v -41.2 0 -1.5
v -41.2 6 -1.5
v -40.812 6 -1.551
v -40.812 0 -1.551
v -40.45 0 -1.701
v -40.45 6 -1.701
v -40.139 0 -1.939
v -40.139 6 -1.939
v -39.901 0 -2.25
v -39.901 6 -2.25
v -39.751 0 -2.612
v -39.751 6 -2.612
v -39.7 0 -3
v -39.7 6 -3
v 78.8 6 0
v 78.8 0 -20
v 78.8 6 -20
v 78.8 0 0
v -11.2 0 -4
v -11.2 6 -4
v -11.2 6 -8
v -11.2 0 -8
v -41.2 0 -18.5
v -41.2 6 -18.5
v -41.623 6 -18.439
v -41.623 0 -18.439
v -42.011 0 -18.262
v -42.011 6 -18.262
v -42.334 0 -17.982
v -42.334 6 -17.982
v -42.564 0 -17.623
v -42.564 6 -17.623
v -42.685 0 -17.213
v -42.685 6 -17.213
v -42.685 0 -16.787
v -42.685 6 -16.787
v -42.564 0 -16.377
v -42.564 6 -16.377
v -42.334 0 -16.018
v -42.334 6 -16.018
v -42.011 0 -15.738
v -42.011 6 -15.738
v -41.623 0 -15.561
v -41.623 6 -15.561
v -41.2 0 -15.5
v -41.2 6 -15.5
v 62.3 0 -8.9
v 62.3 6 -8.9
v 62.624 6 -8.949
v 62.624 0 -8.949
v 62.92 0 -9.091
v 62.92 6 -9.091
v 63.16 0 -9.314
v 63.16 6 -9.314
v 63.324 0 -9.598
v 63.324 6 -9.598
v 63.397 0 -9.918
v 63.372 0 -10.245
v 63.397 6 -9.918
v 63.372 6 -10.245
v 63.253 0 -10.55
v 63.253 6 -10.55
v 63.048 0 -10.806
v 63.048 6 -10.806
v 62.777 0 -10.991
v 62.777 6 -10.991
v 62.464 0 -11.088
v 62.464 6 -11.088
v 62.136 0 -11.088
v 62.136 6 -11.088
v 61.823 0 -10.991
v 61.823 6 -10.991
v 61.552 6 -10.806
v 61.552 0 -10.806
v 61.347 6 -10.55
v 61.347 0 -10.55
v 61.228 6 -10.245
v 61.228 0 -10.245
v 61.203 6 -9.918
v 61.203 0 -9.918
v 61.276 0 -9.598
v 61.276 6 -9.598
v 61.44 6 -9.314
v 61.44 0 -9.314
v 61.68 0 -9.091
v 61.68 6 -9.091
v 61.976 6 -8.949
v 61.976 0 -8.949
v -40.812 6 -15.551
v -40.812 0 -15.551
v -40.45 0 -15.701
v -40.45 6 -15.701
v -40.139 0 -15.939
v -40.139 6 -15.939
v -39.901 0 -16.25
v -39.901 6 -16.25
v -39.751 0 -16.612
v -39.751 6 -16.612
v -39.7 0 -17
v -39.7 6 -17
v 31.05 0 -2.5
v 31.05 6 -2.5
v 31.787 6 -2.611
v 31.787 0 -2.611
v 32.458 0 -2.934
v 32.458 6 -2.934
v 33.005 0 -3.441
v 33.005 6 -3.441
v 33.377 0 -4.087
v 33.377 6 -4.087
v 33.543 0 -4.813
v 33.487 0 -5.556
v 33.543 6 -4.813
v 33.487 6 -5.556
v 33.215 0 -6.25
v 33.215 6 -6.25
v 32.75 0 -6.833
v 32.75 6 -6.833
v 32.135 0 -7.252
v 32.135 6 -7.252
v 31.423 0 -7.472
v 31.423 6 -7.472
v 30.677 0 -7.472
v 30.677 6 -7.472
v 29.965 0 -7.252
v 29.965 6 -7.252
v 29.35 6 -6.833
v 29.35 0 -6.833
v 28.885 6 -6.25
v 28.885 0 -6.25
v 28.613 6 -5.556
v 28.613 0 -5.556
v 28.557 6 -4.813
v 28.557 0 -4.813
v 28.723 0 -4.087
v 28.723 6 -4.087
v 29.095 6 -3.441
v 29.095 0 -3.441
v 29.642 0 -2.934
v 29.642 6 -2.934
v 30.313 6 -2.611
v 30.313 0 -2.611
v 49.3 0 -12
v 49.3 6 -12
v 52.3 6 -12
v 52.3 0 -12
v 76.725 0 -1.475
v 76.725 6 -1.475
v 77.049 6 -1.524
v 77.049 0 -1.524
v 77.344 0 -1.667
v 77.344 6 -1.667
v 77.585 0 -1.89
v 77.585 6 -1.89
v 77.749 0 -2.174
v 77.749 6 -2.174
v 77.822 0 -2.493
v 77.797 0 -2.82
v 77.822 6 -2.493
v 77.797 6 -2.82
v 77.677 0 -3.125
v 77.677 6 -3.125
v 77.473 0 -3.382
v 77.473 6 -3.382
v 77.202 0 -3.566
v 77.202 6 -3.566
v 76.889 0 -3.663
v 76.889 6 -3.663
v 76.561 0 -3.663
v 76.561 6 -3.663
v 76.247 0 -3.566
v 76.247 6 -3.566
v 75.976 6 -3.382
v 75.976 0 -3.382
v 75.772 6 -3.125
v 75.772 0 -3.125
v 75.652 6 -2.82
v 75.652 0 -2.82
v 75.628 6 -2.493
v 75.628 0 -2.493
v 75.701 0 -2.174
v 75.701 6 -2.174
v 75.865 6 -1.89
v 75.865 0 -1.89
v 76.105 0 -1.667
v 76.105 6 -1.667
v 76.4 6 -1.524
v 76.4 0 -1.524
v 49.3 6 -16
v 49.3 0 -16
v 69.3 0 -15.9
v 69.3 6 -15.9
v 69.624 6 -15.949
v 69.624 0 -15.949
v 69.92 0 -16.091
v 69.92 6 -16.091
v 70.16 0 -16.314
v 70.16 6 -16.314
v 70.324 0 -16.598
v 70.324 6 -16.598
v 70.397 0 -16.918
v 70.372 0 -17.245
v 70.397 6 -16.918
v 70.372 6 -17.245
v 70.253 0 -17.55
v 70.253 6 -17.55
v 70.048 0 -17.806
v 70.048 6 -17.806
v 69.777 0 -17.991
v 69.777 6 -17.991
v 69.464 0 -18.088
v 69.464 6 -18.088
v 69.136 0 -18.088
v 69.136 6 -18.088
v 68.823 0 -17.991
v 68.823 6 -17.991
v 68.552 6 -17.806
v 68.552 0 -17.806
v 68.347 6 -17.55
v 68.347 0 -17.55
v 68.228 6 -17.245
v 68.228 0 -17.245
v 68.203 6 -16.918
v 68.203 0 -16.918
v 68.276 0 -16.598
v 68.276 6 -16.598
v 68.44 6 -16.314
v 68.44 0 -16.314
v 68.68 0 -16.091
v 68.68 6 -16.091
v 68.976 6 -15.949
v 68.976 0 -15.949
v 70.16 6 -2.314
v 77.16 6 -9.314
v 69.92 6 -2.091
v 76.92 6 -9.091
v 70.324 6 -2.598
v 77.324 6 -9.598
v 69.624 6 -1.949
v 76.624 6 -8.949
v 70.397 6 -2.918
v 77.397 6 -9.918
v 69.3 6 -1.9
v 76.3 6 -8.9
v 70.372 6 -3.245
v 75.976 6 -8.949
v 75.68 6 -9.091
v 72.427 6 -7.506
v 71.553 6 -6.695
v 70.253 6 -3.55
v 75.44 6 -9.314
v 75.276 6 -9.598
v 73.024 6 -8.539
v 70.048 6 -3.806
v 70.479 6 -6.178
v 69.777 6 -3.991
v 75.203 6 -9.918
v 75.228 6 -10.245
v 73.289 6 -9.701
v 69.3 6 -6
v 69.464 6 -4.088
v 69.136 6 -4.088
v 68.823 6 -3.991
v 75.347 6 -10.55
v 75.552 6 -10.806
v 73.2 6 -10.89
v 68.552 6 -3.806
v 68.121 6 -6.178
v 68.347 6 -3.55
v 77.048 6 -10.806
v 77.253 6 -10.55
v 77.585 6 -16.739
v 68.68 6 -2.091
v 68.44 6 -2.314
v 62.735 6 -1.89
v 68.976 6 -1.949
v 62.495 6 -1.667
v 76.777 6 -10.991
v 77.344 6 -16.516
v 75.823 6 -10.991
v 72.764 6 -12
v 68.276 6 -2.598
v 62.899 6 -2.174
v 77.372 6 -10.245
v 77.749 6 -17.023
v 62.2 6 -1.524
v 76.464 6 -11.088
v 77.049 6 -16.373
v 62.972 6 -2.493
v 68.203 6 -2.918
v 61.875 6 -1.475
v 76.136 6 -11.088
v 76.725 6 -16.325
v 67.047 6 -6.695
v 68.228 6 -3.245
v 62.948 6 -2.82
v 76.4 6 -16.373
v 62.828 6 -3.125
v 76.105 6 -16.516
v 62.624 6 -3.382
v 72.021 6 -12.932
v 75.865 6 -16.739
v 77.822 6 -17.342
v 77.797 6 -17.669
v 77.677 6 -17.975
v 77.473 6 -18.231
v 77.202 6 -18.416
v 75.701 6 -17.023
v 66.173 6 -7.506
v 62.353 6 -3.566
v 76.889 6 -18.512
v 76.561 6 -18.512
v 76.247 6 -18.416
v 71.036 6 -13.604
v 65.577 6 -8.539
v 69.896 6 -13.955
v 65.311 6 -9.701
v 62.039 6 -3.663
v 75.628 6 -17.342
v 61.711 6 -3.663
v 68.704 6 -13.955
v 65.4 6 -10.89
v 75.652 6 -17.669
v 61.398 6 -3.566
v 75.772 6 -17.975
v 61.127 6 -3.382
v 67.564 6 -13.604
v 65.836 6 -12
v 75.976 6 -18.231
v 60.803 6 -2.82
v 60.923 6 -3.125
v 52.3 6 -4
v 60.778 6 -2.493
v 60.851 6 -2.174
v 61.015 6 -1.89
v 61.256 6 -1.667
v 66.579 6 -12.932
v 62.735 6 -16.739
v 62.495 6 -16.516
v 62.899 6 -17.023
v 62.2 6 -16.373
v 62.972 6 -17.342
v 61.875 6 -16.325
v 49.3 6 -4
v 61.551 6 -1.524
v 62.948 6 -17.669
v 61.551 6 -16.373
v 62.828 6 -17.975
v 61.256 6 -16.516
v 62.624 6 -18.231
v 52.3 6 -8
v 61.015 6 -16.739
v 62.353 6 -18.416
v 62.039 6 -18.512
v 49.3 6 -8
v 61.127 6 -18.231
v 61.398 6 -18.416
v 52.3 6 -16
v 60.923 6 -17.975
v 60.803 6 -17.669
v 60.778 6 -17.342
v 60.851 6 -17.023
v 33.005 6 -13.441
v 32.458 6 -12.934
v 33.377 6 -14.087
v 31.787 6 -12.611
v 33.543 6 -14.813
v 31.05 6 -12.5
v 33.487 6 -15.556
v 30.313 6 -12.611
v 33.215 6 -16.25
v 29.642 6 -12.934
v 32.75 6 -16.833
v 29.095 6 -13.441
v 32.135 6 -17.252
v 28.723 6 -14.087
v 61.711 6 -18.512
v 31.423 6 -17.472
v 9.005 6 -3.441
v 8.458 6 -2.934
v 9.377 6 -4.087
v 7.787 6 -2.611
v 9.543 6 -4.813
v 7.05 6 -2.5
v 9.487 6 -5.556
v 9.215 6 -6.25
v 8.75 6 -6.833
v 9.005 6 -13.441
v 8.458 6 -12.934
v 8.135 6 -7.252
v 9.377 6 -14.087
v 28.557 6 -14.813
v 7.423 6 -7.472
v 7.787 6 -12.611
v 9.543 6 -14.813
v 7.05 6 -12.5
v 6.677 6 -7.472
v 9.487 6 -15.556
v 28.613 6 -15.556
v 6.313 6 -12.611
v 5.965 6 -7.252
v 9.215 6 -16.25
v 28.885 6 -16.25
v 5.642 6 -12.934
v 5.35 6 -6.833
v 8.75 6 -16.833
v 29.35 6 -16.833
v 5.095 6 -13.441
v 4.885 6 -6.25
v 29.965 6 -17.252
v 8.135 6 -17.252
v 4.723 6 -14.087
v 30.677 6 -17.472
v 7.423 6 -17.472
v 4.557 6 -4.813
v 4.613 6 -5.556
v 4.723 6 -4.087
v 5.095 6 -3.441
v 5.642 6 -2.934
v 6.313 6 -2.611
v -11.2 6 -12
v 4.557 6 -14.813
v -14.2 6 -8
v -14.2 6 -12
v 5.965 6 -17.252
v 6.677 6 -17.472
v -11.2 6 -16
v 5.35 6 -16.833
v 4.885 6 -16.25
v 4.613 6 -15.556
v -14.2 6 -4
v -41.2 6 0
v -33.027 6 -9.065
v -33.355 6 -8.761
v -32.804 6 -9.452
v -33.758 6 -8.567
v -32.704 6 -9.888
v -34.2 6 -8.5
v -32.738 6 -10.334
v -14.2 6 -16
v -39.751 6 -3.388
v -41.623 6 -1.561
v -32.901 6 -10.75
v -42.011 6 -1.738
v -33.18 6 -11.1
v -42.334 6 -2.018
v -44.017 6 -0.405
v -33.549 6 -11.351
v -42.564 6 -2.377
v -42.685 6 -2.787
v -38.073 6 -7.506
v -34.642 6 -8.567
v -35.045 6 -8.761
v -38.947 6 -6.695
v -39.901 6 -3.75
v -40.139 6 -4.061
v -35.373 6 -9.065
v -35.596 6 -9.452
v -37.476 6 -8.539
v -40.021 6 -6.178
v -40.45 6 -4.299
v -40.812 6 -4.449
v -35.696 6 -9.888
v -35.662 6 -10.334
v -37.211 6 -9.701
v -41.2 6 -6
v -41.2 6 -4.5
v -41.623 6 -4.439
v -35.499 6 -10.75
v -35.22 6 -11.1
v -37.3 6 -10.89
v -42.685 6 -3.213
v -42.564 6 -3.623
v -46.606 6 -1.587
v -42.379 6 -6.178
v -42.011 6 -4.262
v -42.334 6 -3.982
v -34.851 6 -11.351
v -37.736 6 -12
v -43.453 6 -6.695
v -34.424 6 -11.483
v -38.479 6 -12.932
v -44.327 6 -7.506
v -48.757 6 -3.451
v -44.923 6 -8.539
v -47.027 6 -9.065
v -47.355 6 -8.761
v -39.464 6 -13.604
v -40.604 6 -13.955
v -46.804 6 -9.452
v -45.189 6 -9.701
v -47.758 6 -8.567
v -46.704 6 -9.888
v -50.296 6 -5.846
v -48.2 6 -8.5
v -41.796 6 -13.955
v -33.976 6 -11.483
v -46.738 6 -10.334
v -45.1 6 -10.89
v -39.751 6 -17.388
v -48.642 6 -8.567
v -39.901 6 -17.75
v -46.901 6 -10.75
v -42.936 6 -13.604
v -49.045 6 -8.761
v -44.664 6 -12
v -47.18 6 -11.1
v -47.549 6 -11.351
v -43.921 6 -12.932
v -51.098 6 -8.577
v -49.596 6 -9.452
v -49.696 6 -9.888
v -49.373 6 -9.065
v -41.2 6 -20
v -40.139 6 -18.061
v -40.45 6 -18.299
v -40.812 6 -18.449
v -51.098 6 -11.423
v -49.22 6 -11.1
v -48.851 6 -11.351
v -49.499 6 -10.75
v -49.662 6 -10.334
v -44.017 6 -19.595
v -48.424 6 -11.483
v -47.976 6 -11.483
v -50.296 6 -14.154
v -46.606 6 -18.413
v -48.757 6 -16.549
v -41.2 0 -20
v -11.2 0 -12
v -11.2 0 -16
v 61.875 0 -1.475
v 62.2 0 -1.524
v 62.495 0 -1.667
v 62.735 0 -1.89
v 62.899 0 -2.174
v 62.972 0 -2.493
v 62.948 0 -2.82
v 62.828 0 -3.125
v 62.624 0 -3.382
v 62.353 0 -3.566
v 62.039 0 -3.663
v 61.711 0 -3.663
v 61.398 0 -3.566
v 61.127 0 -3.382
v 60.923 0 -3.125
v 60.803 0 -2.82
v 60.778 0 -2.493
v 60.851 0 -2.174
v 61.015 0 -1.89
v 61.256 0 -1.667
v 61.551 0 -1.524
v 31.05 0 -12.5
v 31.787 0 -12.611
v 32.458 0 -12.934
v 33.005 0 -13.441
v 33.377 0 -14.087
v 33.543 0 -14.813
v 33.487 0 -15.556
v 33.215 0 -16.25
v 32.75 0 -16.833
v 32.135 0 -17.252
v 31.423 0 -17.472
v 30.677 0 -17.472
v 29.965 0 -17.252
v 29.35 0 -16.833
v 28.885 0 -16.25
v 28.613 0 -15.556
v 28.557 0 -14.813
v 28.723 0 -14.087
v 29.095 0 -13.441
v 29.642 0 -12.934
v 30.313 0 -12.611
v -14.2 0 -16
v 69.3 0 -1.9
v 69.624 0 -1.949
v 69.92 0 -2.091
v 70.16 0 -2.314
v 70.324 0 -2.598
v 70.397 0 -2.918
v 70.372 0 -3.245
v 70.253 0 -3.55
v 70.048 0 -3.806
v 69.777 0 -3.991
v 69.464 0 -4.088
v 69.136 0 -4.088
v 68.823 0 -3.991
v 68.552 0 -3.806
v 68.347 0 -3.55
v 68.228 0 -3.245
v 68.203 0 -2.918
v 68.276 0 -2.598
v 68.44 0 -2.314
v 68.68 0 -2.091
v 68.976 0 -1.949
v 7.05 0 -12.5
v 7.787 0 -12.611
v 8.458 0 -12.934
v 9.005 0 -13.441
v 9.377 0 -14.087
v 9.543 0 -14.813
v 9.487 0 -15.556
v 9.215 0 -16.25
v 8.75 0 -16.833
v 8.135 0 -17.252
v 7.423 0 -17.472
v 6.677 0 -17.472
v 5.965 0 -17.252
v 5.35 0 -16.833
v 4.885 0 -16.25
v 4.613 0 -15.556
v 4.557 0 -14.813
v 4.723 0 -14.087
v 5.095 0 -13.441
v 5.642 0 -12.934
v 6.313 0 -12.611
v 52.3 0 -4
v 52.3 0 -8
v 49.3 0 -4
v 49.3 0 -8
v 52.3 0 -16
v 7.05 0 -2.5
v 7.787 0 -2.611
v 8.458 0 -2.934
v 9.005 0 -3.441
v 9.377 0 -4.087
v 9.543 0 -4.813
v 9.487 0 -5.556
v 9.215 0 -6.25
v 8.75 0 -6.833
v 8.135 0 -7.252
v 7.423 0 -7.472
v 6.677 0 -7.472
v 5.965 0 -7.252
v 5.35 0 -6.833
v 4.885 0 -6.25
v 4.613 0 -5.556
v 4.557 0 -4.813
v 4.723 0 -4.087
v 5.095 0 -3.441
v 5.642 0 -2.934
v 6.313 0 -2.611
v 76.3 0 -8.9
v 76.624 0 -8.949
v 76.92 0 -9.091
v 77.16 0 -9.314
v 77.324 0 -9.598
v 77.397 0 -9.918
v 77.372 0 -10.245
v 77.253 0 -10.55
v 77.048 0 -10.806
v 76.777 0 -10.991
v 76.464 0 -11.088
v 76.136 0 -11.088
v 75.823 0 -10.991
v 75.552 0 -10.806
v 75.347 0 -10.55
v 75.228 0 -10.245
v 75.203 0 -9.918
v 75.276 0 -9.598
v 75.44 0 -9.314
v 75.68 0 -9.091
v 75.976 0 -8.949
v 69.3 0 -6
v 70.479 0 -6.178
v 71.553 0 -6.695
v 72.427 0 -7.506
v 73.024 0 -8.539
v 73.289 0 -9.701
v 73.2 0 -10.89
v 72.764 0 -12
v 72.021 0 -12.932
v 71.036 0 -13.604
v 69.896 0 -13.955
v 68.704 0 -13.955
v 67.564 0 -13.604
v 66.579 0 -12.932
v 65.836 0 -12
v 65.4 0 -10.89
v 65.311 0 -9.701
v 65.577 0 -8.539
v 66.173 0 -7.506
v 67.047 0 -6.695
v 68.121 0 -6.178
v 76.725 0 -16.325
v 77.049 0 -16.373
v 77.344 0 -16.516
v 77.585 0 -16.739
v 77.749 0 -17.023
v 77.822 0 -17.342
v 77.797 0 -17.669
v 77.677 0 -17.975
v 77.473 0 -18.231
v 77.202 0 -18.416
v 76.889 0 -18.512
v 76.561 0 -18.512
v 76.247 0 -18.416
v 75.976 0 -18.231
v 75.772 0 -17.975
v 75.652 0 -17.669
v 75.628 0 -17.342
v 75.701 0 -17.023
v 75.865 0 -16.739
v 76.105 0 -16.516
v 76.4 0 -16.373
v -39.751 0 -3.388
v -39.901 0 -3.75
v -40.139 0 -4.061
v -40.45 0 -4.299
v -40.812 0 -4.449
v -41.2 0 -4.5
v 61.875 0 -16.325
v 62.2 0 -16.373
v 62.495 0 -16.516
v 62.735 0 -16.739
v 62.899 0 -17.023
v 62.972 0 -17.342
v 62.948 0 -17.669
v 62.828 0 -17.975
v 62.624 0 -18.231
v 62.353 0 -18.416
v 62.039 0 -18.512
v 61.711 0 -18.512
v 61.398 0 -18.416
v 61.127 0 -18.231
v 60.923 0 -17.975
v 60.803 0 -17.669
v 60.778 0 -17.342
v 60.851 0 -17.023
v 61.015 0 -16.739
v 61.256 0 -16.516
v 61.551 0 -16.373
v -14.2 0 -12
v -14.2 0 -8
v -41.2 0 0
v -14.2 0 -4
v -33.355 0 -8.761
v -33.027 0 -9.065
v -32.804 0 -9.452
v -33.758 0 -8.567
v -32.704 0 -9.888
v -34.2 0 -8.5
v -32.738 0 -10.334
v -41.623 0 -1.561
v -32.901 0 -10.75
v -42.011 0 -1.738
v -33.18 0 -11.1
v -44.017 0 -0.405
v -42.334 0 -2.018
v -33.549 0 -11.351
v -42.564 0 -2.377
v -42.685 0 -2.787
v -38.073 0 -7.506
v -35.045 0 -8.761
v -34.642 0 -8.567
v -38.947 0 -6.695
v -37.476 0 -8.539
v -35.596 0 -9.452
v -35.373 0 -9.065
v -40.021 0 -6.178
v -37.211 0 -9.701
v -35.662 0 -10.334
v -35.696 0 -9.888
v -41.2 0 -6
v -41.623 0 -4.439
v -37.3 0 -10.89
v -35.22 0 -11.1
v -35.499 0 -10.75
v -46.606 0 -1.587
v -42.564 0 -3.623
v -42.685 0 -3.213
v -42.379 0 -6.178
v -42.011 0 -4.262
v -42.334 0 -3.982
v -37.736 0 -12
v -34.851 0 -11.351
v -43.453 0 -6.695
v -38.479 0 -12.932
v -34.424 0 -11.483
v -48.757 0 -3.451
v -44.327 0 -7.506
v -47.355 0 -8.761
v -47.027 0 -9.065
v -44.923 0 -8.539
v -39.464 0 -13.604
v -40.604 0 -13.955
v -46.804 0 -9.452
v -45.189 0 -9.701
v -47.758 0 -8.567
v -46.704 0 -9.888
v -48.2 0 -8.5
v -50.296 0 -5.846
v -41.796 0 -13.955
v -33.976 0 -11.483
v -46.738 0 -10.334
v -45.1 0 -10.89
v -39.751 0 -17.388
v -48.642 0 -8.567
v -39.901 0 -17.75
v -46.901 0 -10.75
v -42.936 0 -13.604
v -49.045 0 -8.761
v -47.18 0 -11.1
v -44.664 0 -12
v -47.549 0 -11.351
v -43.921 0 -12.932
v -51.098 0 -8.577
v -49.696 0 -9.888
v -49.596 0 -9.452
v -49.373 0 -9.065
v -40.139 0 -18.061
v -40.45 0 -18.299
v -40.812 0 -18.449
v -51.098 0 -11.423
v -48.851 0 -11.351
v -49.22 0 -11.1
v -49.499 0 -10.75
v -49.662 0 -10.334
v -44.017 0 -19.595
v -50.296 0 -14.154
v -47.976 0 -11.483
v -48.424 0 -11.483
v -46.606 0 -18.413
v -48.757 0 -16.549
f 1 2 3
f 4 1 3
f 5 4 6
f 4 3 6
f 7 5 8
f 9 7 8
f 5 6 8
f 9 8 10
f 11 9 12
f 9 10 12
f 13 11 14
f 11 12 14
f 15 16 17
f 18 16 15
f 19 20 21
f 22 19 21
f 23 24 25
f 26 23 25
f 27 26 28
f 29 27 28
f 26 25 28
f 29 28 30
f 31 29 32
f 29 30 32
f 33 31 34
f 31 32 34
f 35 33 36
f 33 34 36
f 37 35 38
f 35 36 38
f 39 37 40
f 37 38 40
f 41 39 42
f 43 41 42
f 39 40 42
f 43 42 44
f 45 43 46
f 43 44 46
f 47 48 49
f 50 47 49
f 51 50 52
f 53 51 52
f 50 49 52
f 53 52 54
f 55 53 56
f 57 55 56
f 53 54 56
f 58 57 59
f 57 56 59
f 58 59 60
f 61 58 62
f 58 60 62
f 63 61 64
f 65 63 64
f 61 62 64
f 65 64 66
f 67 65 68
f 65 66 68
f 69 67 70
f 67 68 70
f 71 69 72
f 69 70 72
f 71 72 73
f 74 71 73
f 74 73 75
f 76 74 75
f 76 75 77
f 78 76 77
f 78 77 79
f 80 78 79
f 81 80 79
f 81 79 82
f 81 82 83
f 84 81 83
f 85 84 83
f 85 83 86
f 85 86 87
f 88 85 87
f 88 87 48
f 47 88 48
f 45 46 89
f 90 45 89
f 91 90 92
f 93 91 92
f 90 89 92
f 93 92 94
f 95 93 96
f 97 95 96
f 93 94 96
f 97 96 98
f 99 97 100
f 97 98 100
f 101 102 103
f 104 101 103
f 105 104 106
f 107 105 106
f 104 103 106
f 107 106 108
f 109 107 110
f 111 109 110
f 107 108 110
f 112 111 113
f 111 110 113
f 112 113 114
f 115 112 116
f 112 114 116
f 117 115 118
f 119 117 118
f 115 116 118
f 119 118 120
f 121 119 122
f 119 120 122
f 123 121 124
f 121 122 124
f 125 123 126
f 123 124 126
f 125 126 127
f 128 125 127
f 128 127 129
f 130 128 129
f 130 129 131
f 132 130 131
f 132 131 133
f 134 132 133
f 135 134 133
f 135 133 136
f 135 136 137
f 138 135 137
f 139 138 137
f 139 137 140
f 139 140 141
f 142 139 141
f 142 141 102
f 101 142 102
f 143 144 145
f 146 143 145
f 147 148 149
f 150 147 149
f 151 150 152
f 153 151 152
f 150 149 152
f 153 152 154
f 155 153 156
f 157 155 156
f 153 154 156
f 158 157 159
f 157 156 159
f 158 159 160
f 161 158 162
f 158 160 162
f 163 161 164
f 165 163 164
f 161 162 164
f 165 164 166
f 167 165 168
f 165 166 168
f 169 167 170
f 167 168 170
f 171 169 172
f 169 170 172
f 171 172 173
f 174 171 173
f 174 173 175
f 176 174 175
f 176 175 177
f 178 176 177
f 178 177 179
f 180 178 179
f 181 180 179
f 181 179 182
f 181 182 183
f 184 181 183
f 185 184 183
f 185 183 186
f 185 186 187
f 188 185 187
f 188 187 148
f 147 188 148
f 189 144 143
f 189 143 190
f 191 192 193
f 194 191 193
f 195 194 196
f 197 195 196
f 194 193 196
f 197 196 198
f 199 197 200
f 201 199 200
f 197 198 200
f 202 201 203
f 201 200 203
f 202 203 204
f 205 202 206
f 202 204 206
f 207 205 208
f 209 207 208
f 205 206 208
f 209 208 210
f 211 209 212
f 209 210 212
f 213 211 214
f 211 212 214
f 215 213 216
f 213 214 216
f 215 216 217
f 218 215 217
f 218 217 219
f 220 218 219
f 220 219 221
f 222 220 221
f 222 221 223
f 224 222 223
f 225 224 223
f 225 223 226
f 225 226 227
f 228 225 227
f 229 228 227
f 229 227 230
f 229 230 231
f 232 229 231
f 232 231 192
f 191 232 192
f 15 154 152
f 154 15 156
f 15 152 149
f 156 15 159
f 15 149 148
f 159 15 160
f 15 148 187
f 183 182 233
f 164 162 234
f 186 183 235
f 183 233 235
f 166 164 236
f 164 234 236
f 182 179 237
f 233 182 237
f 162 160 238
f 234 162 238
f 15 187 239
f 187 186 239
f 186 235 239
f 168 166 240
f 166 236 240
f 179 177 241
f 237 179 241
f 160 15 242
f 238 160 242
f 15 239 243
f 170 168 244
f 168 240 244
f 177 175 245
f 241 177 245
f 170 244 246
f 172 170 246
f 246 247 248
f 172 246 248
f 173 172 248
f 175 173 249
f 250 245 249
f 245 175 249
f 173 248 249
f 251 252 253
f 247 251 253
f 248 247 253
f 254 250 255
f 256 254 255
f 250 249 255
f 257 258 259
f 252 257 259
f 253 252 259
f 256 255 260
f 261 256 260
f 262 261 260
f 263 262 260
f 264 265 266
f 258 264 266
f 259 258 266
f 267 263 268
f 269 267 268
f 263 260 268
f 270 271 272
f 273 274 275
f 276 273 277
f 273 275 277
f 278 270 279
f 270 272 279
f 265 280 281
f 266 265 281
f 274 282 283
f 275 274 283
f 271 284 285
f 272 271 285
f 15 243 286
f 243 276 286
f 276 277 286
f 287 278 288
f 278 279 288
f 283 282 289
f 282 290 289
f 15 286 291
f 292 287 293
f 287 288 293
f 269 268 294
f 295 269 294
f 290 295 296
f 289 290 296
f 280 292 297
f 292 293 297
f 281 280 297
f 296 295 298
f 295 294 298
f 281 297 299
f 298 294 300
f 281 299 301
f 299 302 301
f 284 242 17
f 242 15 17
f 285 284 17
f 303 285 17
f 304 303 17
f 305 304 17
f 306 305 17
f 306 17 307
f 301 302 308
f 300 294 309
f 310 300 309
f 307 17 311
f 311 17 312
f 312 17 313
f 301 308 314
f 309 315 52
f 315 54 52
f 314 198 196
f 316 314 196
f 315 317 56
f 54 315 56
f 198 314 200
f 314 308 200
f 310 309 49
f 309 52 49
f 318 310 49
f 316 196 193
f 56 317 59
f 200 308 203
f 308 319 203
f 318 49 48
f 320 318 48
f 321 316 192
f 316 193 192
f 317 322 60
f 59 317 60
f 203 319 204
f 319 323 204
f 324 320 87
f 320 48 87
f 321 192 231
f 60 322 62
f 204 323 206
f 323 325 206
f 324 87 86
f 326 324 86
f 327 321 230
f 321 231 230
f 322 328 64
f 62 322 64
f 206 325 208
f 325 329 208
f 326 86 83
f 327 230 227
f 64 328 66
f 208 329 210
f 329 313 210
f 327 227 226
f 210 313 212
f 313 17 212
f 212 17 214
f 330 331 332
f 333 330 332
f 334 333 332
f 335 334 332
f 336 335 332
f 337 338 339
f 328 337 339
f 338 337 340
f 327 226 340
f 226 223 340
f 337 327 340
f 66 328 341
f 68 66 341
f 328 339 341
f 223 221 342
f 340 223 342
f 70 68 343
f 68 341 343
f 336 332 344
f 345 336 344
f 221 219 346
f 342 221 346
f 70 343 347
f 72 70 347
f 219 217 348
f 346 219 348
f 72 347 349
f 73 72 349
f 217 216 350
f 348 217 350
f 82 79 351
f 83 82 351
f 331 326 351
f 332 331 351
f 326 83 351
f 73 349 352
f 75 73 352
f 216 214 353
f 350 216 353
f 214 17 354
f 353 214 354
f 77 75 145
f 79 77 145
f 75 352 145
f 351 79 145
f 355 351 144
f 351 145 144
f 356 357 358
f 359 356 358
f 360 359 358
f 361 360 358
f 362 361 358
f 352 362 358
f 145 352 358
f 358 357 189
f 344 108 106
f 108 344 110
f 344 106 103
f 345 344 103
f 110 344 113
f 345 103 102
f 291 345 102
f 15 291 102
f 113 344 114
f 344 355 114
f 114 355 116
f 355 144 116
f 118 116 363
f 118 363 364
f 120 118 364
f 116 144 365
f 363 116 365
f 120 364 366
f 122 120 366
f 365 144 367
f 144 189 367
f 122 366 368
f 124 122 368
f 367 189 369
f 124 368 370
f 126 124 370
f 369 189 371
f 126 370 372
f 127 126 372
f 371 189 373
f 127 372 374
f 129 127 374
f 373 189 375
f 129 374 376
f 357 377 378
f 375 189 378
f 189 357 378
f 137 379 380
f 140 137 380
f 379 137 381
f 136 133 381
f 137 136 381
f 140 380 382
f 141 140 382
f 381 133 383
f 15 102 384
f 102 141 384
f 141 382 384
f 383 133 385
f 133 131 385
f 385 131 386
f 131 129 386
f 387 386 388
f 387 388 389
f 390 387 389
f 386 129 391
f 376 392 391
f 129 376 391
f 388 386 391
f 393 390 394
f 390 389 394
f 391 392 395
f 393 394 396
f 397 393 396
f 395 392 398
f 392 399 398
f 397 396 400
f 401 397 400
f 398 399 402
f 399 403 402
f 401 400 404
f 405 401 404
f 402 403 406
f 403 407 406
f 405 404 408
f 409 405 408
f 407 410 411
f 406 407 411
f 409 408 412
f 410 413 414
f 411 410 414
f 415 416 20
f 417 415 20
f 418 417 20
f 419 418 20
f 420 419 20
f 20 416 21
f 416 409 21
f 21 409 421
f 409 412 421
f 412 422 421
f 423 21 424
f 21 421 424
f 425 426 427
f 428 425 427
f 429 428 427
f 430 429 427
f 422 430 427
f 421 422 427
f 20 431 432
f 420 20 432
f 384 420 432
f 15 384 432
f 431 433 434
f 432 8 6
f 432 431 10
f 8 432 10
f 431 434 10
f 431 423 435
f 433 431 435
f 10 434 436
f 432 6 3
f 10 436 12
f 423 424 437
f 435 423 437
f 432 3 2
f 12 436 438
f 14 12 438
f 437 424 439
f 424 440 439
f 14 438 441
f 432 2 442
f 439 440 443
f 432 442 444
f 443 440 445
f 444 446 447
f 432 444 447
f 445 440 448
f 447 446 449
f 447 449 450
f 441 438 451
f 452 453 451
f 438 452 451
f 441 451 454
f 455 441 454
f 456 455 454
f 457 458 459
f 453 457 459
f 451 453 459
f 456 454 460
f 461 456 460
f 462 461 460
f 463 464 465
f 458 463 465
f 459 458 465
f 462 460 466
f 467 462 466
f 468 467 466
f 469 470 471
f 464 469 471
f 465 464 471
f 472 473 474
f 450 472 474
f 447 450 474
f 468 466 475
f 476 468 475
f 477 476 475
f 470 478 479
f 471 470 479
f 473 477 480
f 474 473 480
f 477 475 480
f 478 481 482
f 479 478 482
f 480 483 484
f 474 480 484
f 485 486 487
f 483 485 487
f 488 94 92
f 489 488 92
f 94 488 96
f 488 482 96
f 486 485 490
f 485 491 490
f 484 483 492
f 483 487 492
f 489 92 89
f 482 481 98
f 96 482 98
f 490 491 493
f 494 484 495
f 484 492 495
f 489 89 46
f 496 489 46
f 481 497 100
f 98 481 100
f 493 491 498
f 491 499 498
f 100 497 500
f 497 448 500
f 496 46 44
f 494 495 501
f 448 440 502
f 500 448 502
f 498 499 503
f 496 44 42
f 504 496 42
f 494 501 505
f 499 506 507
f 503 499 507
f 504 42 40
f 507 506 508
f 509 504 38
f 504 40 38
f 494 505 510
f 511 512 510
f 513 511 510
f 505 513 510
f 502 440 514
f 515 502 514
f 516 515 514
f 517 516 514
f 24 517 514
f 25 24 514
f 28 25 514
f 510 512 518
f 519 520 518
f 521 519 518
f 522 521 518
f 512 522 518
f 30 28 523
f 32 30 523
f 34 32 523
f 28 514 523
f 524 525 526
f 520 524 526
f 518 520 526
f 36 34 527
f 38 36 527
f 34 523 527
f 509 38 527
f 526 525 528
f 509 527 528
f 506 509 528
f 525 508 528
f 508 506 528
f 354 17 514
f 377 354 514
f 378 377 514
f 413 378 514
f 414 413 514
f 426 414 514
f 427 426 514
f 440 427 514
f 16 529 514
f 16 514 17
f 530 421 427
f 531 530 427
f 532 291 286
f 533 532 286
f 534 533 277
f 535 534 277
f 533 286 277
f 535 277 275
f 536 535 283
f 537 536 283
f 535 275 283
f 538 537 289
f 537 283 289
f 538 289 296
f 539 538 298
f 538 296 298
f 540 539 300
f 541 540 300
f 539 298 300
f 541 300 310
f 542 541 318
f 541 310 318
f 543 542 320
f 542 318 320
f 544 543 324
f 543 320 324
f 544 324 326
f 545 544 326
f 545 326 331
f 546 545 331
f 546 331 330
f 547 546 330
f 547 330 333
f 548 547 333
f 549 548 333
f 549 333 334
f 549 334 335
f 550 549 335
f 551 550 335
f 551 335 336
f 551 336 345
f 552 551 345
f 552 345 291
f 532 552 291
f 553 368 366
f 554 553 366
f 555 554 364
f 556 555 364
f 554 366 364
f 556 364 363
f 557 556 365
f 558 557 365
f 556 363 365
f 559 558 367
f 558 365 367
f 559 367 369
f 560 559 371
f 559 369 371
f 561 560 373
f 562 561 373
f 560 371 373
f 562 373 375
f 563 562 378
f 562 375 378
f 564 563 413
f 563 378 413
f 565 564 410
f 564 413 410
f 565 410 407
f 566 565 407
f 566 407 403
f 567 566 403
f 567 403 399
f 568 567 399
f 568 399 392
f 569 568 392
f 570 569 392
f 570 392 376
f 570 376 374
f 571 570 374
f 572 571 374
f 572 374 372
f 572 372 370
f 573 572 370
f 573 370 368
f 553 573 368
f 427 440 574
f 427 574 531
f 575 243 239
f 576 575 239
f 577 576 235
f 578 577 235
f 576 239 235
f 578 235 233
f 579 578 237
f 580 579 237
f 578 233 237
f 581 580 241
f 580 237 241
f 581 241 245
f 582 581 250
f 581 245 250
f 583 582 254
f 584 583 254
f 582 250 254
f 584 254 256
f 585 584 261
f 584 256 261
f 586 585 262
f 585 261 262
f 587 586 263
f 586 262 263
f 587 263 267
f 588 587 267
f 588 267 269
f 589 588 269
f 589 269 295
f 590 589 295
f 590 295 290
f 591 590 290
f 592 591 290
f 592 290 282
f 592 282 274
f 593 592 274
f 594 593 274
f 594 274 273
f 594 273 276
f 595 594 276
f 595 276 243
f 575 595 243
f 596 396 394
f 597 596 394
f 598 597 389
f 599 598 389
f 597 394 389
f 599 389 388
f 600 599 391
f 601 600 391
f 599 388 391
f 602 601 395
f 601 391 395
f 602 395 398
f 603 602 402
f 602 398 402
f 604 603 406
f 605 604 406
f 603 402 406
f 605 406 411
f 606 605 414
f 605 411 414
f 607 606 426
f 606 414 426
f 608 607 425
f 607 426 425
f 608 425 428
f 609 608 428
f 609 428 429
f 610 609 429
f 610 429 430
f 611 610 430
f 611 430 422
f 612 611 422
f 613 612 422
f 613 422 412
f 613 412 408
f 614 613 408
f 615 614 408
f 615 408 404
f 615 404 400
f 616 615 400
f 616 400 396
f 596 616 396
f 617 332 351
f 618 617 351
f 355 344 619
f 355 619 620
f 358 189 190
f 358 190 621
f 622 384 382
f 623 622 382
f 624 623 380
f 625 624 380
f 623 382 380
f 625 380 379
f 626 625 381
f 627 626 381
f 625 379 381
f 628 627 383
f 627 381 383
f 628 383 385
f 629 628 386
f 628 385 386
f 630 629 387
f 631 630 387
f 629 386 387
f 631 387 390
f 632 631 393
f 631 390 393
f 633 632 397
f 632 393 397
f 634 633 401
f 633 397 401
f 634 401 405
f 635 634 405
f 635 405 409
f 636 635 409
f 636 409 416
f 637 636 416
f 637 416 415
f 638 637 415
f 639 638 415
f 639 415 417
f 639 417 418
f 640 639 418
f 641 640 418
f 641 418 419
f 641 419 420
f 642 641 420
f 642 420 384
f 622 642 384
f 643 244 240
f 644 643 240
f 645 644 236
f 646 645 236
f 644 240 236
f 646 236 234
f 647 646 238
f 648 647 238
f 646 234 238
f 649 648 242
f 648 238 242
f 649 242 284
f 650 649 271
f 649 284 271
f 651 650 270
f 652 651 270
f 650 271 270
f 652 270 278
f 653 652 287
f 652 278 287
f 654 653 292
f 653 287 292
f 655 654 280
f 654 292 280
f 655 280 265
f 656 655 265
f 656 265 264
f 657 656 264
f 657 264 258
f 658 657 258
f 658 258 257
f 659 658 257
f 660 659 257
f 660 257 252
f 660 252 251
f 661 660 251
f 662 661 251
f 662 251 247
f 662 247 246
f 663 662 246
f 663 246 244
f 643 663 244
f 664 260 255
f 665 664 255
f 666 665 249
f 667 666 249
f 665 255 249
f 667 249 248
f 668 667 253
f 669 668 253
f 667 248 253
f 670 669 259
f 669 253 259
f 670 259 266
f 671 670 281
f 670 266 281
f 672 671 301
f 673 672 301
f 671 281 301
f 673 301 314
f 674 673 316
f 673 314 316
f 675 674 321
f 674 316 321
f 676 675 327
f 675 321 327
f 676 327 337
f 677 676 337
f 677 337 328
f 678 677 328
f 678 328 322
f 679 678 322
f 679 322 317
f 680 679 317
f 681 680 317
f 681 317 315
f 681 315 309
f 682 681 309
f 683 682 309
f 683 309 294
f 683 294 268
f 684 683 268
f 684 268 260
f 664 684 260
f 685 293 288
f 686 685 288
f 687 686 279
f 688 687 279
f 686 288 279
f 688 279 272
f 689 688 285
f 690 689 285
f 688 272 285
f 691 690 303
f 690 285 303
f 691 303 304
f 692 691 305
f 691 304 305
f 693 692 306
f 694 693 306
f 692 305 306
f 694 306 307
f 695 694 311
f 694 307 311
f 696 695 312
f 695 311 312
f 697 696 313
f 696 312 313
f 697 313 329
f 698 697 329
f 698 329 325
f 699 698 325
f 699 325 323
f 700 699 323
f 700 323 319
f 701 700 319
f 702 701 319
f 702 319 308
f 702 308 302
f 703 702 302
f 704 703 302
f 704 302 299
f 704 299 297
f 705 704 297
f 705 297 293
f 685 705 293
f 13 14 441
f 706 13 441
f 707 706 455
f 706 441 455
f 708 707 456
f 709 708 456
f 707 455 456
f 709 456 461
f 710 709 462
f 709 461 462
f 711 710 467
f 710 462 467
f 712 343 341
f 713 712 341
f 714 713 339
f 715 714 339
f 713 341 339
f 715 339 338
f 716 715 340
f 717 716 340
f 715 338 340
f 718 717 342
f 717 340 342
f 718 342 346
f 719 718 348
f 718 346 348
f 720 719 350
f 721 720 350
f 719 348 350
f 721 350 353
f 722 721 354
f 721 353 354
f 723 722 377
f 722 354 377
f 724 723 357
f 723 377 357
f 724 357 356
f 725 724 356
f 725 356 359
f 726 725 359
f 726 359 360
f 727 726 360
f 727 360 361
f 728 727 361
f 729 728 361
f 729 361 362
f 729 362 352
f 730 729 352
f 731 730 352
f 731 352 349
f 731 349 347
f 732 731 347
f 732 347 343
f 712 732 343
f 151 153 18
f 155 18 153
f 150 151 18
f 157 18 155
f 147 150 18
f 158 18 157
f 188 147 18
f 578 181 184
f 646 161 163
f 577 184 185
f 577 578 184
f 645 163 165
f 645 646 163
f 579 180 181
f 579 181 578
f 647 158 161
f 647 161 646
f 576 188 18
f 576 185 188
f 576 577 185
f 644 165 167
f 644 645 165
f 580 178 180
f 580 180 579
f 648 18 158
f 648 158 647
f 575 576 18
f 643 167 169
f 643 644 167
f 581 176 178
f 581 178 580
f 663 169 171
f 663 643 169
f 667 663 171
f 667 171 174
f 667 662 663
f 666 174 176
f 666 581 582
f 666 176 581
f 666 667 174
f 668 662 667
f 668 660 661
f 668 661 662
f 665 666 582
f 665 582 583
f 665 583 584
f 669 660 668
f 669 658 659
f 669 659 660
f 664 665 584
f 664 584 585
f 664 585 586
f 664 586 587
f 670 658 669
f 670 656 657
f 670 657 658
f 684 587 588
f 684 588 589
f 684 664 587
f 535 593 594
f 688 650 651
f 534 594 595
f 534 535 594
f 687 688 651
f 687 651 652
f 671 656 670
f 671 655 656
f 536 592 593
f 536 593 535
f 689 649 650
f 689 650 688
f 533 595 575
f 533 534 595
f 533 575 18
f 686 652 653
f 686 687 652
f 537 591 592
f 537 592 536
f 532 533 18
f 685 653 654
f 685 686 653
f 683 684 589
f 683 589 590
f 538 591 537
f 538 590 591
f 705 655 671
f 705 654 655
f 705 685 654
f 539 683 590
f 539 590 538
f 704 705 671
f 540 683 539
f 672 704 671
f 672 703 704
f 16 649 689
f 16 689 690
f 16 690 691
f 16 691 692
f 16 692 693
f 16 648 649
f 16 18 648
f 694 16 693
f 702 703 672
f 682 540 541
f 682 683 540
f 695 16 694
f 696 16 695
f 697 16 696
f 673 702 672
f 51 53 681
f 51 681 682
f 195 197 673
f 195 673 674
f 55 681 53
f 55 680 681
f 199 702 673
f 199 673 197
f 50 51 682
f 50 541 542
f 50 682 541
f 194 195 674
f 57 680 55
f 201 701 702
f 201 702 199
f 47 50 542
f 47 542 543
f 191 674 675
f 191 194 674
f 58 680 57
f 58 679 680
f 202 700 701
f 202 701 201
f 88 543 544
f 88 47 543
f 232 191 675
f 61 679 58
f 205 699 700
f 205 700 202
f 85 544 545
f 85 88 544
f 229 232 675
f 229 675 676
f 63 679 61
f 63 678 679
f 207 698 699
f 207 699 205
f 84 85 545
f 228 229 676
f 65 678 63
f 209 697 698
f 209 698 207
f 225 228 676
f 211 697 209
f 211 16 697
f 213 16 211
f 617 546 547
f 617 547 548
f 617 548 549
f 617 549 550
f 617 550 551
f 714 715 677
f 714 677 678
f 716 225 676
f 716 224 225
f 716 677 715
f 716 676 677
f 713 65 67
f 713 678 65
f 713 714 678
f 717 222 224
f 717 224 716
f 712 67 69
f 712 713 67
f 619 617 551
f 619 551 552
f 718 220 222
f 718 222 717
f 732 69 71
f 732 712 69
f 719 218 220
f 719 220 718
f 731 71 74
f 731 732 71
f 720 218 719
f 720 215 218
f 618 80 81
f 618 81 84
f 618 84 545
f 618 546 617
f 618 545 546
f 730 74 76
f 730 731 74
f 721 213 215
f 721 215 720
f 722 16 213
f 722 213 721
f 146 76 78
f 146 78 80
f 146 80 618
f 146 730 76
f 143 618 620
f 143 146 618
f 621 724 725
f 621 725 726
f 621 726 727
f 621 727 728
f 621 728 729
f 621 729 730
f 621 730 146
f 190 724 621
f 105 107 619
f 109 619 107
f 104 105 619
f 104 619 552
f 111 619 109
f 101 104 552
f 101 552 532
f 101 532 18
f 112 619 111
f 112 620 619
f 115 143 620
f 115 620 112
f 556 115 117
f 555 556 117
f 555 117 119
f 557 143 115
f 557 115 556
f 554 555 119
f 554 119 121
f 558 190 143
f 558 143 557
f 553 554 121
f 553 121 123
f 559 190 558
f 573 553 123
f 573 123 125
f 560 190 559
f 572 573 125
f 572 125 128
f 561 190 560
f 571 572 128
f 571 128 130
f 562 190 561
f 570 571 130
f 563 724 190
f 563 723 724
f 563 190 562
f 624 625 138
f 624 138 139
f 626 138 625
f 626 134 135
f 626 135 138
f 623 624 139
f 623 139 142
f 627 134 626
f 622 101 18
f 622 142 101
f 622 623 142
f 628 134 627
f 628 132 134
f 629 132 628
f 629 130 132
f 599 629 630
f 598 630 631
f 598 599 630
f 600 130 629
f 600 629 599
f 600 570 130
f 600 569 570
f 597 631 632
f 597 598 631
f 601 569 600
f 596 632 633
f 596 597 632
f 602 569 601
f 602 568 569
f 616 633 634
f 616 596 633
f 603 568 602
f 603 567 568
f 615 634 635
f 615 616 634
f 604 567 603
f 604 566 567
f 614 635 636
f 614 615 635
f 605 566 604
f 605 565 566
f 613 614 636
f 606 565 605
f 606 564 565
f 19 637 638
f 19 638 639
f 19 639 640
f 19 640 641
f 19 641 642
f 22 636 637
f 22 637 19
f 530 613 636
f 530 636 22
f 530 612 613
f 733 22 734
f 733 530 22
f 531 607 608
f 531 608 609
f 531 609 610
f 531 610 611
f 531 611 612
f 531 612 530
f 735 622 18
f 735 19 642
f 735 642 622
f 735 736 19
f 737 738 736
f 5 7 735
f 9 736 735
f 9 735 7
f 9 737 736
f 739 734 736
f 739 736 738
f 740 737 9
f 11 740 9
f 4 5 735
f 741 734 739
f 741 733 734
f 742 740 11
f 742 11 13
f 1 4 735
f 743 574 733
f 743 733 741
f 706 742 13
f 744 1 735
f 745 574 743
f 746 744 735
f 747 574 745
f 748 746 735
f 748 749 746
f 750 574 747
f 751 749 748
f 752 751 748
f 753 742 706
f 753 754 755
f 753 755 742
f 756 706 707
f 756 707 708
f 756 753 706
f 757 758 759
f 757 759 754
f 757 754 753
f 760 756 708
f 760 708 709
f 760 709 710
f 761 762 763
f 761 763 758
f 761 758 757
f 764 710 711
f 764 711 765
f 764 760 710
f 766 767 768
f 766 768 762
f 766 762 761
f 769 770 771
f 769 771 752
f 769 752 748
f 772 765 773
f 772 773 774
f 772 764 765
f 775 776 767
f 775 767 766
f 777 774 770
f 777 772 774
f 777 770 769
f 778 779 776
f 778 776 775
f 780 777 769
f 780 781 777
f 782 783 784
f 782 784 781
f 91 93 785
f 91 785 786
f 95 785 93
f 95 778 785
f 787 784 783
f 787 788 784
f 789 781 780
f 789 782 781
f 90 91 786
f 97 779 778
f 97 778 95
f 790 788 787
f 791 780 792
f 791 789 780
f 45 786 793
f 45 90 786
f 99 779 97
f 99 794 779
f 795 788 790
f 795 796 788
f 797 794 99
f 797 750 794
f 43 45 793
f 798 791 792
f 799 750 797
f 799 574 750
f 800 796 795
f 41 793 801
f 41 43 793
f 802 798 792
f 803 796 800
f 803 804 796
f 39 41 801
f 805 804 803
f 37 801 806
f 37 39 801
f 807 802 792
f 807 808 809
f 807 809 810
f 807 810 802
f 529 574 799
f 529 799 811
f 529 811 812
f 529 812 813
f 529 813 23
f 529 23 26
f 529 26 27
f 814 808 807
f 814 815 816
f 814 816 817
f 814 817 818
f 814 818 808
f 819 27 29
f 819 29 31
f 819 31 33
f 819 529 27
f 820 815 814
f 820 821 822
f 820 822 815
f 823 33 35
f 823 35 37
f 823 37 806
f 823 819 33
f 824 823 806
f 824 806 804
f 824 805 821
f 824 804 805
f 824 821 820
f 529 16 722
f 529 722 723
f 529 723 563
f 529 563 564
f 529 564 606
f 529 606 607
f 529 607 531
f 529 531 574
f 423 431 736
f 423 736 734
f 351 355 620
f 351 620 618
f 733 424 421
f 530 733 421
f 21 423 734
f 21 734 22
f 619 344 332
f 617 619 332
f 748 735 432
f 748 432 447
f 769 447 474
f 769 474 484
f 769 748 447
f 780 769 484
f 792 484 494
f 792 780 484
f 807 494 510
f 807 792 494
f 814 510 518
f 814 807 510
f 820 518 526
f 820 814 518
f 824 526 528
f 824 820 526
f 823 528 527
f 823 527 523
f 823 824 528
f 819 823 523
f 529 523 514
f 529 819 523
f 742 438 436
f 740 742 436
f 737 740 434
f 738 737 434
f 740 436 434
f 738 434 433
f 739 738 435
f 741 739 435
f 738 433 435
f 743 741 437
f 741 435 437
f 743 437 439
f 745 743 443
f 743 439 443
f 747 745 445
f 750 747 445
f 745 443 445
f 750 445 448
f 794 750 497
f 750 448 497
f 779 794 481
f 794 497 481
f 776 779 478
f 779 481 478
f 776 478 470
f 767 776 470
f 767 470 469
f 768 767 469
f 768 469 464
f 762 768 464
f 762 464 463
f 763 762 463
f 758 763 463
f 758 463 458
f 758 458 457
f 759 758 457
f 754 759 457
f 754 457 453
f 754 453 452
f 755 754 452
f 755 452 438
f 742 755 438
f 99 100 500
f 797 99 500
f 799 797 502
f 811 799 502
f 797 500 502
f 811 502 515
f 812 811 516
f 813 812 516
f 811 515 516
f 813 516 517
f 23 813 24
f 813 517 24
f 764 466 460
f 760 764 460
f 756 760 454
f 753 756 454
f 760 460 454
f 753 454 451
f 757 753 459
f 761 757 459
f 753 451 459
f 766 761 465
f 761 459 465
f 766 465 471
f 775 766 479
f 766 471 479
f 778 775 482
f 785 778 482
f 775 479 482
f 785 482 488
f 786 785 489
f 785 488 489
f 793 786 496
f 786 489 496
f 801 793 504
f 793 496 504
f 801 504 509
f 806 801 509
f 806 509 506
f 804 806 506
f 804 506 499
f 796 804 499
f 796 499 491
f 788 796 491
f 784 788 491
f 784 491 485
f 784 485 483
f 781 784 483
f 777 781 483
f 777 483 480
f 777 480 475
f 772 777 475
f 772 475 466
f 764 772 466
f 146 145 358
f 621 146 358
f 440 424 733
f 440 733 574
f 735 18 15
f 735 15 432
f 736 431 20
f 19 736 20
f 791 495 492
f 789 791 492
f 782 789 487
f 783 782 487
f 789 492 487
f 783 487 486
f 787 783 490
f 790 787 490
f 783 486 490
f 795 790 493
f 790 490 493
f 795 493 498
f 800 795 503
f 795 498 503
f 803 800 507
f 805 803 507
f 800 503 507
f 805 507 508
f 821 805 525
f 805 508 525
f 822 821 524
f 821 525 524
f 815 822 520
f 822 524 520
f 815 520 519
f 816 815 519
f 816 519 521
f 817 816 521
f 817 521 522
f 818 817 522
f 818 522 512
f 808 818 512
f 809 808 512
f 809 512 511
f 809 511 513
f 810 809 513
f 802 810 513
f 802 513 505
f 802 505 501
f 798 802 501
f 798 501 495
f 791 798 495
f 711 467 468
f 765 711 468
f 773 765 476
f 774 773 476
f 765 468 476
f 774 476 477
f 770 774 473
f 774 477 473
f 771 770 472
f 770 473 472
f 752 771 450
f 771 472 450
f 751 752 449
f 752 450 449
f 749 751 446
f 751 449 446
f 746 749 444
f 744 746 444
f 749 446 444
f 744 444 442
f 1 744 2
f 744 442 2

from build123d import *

# Parameters (mm, degrees)
EXTRUDE_1_DEPTH     = 6
SKETCH_2_R          = 1.5
SKETCH_2_R_2        = 4
CUT_EXTRUDE_1_DEPTH = 10
SKETCH_3_W          = 3
SKETCH_3_H          = 4
CUT_EXTRUDE_2_DEPTH = 10
SKETCH_4_R          = 4
SKETCH_4_R_2        = 1.1
SKETCH_4_W          = 3
SKETCH_4_H          = 4
CUT_EXTRUDE_4_DEPTH = 10
SKETCH_5_R          = 2.5
CUT_EXTRUDE_5_DEPTH = 10


with BuildPart() as part:
    # 草图1 → 凸台-拉伸1 (new body)
    with BuildSketch(Plane(origin=(0, 0, 0), x_dir=(1, 0, 0), z_dir=(0, 1, 0))):
        with BuildLine():
            Line((-41.199983302, 20), (78.800016698, 20))
            Line((78.800016698, 20), (78.800016698, 0))
            Line((78.800016698, 0), (-41.199983302, 0))
            ThreePointArc((-41.199983302, 0), (-51.199983302, 10), (-41.199983302, 20))
        make_face()
    extrude(amount=EXTRUDE_1_DEPTH)

    # 草图2 → 切除-拉伸1 (cut)
    with BuildSketch(Plane(origin=(0, 6, 0), x_dir=(1, 0, 0), z_dir=(0, 1, 0))):
        with Locations(Location((-48.199983302, 10, 0), (0, 0, 270))):
            Circle(SKETCH_2_R)
        with BuildLine():
            ThreePointArc((-39.699983302, 17), (-40.13932313, 18.060660172), (-41.199983302, 18.5))
            Line((-41.199983302, 18.5), (-41.199983302, 17))
            Line((-41.199983302, 17), (-41.199983302, 15.5))
            ThreePointArc((-41.199983302, 15.5), (-40.13932313, 15.939339828), (-39.699983302, 17))
        make_face()
        with BuildLine():
            Line((-41.199983302, 17), (-41.199983302, 18.5))
            ThreePointArc((-41.199983302, 18.5), (-42.699983302, 17), (-41.199983302, 15.5))
            Line((-41.199983302, 15.5), (-41.199983302, 17))
        make_face()
        with Locations(Location((-34.199983302, 10, 0), (0, 0, 270))):
            Circle(SKETCH_2_R)
        with BuildLine():
            ThreePointArc((-39.699983302, 3), (-40.13932313, 4.060660172), (-41.199983302, 4.5))
            Line((-41.199983302, 4.5), (-41.199983302, 3))
            Line((-41.199983302, 3), (-41.199983302, 1.5))
            ThreePointArc((-41.199983302, 1.5), (-40.13932313, 1.939339828), (-39.699983302, 3))
        make_face()
        with BuildLine():
            Line((-41.199983302, 3), (-41.199983302, 4.5))
            ThreePointArc((-41.199983302, 4.5), (-42.699983302, 3), (-41.199983302, 1.5))
            Line((-41.199983302, 1.5), (-41.199983302, 3))
        make_face()
        with Locations(Location((-41.199983302, 10, 0), (0, 0, 270))):
            Circle(SKETCH_2_R_2)
    extrude(amount=-CUT_EXTRUDE_1_DEPTH, mode=Mode.SUBTRACT)

    # 草图3 → 切除-拉伸2 (cut)
    with BuildSketch(Plane(origin=(0, 6, 0), x_dir=(1, 0, 0), z_dir=(0, 1, 0))):
        with Locations((-12.699983302, 14)):
            Rectangle(SKETCH_3_W, SKETCH_3_H)
        with Locations((-12.699983302, 6)):
            Rectangle(SKETCH_3_W, SKETCH_3_H)
    extrude(amount=-CUT_EXTRUDE_2_DEPTH, mode=Mode.SUBTRACT)

    # 草图4 → 切除-拉伸4 (cut)
    with BuildSketch(Plane(origin=(0, 6, 0), x_dir=(1, 0, 0), z_dir=(0, 1, 0))):
        with Locations(Location((69.300016698, 10, 0), (0, 0, 270))):
            Circle(SKETCH_4_R)
        with Locations(Location((76.7246379, 17.424621202, 0), (0, 0, 270))):
            Circle(SKETCH_4_R_2)
        with Locations(Location((62.300016698, 10, 0), (0, 0, 270))):
            Circle(SKETCH_4_R_2)
        with Locations((50.800016698, 6)):
            Rectangle(SKETCH_4_W, SKETCH_4_H)
        with Locations((50.800016698, 14)):
            Rectangle(SKETCH_4_W, SKETCH_4_H)
        with Locations(Location((76.7246379, 2.575378798, 0), (0, 0, 270))):
            Circle(SKETCH_4_R_2)
        with Locations(Location((61.875395496, 2.575378798, 0), (0, 0, 270))):
            Circle(SKETCH_4_R_2)
        with Locations(Location((61.875395496, 17.424621202, 0), (0, 0, 270))):
            Circle(SKETCH_4_R_2)
        with Locations(Location((69.300016698, 17, 0), (0, 0, 270))):
            Circle(SKETCH_4_R_2)
        with Locations(Location((76.300016698, 10, 0), (0, 0, 270))):
            Circle(SKETCH_4_R_2)
        with Locations(Location((69.300016698, 3, 0), (0, 0, 270))):
            Circle(SKETCH_4_R_2)
    extrude(amount=-CUT_EXTRUDE_4_DEPTH, mode=Mode.SUBTRACT)

    # 草图5 → 切除-拉伸5 (cut)
    with BuildSketch(Plane(origin=(0, 6, 0), x_dir=(1, 0, 0), z_dir=(0, 1, 0))):
        with Locations(Location((31.050016698, 15, 0), (0, 0, 270))):
            Circle(SKETCH_5_R)
        with Locations(Location((31.050016698, 5, 0), (0, 0, 270))):
            Circle(SKETCH_5_R)
        with Locations(Location((7.050016698, 15, 0), (0, 0, 270))):
            Circle(SKETCH_5_R)
        with Locations(Location((7.050016698, 5, 0), (0, 0, 270))):
            Circle(SKETCH_5_R)
    extrude(amount=-CUT_EXTRUDE_5_DEPTH, mode=Mode.SUBTRACT)


solid = part.part
